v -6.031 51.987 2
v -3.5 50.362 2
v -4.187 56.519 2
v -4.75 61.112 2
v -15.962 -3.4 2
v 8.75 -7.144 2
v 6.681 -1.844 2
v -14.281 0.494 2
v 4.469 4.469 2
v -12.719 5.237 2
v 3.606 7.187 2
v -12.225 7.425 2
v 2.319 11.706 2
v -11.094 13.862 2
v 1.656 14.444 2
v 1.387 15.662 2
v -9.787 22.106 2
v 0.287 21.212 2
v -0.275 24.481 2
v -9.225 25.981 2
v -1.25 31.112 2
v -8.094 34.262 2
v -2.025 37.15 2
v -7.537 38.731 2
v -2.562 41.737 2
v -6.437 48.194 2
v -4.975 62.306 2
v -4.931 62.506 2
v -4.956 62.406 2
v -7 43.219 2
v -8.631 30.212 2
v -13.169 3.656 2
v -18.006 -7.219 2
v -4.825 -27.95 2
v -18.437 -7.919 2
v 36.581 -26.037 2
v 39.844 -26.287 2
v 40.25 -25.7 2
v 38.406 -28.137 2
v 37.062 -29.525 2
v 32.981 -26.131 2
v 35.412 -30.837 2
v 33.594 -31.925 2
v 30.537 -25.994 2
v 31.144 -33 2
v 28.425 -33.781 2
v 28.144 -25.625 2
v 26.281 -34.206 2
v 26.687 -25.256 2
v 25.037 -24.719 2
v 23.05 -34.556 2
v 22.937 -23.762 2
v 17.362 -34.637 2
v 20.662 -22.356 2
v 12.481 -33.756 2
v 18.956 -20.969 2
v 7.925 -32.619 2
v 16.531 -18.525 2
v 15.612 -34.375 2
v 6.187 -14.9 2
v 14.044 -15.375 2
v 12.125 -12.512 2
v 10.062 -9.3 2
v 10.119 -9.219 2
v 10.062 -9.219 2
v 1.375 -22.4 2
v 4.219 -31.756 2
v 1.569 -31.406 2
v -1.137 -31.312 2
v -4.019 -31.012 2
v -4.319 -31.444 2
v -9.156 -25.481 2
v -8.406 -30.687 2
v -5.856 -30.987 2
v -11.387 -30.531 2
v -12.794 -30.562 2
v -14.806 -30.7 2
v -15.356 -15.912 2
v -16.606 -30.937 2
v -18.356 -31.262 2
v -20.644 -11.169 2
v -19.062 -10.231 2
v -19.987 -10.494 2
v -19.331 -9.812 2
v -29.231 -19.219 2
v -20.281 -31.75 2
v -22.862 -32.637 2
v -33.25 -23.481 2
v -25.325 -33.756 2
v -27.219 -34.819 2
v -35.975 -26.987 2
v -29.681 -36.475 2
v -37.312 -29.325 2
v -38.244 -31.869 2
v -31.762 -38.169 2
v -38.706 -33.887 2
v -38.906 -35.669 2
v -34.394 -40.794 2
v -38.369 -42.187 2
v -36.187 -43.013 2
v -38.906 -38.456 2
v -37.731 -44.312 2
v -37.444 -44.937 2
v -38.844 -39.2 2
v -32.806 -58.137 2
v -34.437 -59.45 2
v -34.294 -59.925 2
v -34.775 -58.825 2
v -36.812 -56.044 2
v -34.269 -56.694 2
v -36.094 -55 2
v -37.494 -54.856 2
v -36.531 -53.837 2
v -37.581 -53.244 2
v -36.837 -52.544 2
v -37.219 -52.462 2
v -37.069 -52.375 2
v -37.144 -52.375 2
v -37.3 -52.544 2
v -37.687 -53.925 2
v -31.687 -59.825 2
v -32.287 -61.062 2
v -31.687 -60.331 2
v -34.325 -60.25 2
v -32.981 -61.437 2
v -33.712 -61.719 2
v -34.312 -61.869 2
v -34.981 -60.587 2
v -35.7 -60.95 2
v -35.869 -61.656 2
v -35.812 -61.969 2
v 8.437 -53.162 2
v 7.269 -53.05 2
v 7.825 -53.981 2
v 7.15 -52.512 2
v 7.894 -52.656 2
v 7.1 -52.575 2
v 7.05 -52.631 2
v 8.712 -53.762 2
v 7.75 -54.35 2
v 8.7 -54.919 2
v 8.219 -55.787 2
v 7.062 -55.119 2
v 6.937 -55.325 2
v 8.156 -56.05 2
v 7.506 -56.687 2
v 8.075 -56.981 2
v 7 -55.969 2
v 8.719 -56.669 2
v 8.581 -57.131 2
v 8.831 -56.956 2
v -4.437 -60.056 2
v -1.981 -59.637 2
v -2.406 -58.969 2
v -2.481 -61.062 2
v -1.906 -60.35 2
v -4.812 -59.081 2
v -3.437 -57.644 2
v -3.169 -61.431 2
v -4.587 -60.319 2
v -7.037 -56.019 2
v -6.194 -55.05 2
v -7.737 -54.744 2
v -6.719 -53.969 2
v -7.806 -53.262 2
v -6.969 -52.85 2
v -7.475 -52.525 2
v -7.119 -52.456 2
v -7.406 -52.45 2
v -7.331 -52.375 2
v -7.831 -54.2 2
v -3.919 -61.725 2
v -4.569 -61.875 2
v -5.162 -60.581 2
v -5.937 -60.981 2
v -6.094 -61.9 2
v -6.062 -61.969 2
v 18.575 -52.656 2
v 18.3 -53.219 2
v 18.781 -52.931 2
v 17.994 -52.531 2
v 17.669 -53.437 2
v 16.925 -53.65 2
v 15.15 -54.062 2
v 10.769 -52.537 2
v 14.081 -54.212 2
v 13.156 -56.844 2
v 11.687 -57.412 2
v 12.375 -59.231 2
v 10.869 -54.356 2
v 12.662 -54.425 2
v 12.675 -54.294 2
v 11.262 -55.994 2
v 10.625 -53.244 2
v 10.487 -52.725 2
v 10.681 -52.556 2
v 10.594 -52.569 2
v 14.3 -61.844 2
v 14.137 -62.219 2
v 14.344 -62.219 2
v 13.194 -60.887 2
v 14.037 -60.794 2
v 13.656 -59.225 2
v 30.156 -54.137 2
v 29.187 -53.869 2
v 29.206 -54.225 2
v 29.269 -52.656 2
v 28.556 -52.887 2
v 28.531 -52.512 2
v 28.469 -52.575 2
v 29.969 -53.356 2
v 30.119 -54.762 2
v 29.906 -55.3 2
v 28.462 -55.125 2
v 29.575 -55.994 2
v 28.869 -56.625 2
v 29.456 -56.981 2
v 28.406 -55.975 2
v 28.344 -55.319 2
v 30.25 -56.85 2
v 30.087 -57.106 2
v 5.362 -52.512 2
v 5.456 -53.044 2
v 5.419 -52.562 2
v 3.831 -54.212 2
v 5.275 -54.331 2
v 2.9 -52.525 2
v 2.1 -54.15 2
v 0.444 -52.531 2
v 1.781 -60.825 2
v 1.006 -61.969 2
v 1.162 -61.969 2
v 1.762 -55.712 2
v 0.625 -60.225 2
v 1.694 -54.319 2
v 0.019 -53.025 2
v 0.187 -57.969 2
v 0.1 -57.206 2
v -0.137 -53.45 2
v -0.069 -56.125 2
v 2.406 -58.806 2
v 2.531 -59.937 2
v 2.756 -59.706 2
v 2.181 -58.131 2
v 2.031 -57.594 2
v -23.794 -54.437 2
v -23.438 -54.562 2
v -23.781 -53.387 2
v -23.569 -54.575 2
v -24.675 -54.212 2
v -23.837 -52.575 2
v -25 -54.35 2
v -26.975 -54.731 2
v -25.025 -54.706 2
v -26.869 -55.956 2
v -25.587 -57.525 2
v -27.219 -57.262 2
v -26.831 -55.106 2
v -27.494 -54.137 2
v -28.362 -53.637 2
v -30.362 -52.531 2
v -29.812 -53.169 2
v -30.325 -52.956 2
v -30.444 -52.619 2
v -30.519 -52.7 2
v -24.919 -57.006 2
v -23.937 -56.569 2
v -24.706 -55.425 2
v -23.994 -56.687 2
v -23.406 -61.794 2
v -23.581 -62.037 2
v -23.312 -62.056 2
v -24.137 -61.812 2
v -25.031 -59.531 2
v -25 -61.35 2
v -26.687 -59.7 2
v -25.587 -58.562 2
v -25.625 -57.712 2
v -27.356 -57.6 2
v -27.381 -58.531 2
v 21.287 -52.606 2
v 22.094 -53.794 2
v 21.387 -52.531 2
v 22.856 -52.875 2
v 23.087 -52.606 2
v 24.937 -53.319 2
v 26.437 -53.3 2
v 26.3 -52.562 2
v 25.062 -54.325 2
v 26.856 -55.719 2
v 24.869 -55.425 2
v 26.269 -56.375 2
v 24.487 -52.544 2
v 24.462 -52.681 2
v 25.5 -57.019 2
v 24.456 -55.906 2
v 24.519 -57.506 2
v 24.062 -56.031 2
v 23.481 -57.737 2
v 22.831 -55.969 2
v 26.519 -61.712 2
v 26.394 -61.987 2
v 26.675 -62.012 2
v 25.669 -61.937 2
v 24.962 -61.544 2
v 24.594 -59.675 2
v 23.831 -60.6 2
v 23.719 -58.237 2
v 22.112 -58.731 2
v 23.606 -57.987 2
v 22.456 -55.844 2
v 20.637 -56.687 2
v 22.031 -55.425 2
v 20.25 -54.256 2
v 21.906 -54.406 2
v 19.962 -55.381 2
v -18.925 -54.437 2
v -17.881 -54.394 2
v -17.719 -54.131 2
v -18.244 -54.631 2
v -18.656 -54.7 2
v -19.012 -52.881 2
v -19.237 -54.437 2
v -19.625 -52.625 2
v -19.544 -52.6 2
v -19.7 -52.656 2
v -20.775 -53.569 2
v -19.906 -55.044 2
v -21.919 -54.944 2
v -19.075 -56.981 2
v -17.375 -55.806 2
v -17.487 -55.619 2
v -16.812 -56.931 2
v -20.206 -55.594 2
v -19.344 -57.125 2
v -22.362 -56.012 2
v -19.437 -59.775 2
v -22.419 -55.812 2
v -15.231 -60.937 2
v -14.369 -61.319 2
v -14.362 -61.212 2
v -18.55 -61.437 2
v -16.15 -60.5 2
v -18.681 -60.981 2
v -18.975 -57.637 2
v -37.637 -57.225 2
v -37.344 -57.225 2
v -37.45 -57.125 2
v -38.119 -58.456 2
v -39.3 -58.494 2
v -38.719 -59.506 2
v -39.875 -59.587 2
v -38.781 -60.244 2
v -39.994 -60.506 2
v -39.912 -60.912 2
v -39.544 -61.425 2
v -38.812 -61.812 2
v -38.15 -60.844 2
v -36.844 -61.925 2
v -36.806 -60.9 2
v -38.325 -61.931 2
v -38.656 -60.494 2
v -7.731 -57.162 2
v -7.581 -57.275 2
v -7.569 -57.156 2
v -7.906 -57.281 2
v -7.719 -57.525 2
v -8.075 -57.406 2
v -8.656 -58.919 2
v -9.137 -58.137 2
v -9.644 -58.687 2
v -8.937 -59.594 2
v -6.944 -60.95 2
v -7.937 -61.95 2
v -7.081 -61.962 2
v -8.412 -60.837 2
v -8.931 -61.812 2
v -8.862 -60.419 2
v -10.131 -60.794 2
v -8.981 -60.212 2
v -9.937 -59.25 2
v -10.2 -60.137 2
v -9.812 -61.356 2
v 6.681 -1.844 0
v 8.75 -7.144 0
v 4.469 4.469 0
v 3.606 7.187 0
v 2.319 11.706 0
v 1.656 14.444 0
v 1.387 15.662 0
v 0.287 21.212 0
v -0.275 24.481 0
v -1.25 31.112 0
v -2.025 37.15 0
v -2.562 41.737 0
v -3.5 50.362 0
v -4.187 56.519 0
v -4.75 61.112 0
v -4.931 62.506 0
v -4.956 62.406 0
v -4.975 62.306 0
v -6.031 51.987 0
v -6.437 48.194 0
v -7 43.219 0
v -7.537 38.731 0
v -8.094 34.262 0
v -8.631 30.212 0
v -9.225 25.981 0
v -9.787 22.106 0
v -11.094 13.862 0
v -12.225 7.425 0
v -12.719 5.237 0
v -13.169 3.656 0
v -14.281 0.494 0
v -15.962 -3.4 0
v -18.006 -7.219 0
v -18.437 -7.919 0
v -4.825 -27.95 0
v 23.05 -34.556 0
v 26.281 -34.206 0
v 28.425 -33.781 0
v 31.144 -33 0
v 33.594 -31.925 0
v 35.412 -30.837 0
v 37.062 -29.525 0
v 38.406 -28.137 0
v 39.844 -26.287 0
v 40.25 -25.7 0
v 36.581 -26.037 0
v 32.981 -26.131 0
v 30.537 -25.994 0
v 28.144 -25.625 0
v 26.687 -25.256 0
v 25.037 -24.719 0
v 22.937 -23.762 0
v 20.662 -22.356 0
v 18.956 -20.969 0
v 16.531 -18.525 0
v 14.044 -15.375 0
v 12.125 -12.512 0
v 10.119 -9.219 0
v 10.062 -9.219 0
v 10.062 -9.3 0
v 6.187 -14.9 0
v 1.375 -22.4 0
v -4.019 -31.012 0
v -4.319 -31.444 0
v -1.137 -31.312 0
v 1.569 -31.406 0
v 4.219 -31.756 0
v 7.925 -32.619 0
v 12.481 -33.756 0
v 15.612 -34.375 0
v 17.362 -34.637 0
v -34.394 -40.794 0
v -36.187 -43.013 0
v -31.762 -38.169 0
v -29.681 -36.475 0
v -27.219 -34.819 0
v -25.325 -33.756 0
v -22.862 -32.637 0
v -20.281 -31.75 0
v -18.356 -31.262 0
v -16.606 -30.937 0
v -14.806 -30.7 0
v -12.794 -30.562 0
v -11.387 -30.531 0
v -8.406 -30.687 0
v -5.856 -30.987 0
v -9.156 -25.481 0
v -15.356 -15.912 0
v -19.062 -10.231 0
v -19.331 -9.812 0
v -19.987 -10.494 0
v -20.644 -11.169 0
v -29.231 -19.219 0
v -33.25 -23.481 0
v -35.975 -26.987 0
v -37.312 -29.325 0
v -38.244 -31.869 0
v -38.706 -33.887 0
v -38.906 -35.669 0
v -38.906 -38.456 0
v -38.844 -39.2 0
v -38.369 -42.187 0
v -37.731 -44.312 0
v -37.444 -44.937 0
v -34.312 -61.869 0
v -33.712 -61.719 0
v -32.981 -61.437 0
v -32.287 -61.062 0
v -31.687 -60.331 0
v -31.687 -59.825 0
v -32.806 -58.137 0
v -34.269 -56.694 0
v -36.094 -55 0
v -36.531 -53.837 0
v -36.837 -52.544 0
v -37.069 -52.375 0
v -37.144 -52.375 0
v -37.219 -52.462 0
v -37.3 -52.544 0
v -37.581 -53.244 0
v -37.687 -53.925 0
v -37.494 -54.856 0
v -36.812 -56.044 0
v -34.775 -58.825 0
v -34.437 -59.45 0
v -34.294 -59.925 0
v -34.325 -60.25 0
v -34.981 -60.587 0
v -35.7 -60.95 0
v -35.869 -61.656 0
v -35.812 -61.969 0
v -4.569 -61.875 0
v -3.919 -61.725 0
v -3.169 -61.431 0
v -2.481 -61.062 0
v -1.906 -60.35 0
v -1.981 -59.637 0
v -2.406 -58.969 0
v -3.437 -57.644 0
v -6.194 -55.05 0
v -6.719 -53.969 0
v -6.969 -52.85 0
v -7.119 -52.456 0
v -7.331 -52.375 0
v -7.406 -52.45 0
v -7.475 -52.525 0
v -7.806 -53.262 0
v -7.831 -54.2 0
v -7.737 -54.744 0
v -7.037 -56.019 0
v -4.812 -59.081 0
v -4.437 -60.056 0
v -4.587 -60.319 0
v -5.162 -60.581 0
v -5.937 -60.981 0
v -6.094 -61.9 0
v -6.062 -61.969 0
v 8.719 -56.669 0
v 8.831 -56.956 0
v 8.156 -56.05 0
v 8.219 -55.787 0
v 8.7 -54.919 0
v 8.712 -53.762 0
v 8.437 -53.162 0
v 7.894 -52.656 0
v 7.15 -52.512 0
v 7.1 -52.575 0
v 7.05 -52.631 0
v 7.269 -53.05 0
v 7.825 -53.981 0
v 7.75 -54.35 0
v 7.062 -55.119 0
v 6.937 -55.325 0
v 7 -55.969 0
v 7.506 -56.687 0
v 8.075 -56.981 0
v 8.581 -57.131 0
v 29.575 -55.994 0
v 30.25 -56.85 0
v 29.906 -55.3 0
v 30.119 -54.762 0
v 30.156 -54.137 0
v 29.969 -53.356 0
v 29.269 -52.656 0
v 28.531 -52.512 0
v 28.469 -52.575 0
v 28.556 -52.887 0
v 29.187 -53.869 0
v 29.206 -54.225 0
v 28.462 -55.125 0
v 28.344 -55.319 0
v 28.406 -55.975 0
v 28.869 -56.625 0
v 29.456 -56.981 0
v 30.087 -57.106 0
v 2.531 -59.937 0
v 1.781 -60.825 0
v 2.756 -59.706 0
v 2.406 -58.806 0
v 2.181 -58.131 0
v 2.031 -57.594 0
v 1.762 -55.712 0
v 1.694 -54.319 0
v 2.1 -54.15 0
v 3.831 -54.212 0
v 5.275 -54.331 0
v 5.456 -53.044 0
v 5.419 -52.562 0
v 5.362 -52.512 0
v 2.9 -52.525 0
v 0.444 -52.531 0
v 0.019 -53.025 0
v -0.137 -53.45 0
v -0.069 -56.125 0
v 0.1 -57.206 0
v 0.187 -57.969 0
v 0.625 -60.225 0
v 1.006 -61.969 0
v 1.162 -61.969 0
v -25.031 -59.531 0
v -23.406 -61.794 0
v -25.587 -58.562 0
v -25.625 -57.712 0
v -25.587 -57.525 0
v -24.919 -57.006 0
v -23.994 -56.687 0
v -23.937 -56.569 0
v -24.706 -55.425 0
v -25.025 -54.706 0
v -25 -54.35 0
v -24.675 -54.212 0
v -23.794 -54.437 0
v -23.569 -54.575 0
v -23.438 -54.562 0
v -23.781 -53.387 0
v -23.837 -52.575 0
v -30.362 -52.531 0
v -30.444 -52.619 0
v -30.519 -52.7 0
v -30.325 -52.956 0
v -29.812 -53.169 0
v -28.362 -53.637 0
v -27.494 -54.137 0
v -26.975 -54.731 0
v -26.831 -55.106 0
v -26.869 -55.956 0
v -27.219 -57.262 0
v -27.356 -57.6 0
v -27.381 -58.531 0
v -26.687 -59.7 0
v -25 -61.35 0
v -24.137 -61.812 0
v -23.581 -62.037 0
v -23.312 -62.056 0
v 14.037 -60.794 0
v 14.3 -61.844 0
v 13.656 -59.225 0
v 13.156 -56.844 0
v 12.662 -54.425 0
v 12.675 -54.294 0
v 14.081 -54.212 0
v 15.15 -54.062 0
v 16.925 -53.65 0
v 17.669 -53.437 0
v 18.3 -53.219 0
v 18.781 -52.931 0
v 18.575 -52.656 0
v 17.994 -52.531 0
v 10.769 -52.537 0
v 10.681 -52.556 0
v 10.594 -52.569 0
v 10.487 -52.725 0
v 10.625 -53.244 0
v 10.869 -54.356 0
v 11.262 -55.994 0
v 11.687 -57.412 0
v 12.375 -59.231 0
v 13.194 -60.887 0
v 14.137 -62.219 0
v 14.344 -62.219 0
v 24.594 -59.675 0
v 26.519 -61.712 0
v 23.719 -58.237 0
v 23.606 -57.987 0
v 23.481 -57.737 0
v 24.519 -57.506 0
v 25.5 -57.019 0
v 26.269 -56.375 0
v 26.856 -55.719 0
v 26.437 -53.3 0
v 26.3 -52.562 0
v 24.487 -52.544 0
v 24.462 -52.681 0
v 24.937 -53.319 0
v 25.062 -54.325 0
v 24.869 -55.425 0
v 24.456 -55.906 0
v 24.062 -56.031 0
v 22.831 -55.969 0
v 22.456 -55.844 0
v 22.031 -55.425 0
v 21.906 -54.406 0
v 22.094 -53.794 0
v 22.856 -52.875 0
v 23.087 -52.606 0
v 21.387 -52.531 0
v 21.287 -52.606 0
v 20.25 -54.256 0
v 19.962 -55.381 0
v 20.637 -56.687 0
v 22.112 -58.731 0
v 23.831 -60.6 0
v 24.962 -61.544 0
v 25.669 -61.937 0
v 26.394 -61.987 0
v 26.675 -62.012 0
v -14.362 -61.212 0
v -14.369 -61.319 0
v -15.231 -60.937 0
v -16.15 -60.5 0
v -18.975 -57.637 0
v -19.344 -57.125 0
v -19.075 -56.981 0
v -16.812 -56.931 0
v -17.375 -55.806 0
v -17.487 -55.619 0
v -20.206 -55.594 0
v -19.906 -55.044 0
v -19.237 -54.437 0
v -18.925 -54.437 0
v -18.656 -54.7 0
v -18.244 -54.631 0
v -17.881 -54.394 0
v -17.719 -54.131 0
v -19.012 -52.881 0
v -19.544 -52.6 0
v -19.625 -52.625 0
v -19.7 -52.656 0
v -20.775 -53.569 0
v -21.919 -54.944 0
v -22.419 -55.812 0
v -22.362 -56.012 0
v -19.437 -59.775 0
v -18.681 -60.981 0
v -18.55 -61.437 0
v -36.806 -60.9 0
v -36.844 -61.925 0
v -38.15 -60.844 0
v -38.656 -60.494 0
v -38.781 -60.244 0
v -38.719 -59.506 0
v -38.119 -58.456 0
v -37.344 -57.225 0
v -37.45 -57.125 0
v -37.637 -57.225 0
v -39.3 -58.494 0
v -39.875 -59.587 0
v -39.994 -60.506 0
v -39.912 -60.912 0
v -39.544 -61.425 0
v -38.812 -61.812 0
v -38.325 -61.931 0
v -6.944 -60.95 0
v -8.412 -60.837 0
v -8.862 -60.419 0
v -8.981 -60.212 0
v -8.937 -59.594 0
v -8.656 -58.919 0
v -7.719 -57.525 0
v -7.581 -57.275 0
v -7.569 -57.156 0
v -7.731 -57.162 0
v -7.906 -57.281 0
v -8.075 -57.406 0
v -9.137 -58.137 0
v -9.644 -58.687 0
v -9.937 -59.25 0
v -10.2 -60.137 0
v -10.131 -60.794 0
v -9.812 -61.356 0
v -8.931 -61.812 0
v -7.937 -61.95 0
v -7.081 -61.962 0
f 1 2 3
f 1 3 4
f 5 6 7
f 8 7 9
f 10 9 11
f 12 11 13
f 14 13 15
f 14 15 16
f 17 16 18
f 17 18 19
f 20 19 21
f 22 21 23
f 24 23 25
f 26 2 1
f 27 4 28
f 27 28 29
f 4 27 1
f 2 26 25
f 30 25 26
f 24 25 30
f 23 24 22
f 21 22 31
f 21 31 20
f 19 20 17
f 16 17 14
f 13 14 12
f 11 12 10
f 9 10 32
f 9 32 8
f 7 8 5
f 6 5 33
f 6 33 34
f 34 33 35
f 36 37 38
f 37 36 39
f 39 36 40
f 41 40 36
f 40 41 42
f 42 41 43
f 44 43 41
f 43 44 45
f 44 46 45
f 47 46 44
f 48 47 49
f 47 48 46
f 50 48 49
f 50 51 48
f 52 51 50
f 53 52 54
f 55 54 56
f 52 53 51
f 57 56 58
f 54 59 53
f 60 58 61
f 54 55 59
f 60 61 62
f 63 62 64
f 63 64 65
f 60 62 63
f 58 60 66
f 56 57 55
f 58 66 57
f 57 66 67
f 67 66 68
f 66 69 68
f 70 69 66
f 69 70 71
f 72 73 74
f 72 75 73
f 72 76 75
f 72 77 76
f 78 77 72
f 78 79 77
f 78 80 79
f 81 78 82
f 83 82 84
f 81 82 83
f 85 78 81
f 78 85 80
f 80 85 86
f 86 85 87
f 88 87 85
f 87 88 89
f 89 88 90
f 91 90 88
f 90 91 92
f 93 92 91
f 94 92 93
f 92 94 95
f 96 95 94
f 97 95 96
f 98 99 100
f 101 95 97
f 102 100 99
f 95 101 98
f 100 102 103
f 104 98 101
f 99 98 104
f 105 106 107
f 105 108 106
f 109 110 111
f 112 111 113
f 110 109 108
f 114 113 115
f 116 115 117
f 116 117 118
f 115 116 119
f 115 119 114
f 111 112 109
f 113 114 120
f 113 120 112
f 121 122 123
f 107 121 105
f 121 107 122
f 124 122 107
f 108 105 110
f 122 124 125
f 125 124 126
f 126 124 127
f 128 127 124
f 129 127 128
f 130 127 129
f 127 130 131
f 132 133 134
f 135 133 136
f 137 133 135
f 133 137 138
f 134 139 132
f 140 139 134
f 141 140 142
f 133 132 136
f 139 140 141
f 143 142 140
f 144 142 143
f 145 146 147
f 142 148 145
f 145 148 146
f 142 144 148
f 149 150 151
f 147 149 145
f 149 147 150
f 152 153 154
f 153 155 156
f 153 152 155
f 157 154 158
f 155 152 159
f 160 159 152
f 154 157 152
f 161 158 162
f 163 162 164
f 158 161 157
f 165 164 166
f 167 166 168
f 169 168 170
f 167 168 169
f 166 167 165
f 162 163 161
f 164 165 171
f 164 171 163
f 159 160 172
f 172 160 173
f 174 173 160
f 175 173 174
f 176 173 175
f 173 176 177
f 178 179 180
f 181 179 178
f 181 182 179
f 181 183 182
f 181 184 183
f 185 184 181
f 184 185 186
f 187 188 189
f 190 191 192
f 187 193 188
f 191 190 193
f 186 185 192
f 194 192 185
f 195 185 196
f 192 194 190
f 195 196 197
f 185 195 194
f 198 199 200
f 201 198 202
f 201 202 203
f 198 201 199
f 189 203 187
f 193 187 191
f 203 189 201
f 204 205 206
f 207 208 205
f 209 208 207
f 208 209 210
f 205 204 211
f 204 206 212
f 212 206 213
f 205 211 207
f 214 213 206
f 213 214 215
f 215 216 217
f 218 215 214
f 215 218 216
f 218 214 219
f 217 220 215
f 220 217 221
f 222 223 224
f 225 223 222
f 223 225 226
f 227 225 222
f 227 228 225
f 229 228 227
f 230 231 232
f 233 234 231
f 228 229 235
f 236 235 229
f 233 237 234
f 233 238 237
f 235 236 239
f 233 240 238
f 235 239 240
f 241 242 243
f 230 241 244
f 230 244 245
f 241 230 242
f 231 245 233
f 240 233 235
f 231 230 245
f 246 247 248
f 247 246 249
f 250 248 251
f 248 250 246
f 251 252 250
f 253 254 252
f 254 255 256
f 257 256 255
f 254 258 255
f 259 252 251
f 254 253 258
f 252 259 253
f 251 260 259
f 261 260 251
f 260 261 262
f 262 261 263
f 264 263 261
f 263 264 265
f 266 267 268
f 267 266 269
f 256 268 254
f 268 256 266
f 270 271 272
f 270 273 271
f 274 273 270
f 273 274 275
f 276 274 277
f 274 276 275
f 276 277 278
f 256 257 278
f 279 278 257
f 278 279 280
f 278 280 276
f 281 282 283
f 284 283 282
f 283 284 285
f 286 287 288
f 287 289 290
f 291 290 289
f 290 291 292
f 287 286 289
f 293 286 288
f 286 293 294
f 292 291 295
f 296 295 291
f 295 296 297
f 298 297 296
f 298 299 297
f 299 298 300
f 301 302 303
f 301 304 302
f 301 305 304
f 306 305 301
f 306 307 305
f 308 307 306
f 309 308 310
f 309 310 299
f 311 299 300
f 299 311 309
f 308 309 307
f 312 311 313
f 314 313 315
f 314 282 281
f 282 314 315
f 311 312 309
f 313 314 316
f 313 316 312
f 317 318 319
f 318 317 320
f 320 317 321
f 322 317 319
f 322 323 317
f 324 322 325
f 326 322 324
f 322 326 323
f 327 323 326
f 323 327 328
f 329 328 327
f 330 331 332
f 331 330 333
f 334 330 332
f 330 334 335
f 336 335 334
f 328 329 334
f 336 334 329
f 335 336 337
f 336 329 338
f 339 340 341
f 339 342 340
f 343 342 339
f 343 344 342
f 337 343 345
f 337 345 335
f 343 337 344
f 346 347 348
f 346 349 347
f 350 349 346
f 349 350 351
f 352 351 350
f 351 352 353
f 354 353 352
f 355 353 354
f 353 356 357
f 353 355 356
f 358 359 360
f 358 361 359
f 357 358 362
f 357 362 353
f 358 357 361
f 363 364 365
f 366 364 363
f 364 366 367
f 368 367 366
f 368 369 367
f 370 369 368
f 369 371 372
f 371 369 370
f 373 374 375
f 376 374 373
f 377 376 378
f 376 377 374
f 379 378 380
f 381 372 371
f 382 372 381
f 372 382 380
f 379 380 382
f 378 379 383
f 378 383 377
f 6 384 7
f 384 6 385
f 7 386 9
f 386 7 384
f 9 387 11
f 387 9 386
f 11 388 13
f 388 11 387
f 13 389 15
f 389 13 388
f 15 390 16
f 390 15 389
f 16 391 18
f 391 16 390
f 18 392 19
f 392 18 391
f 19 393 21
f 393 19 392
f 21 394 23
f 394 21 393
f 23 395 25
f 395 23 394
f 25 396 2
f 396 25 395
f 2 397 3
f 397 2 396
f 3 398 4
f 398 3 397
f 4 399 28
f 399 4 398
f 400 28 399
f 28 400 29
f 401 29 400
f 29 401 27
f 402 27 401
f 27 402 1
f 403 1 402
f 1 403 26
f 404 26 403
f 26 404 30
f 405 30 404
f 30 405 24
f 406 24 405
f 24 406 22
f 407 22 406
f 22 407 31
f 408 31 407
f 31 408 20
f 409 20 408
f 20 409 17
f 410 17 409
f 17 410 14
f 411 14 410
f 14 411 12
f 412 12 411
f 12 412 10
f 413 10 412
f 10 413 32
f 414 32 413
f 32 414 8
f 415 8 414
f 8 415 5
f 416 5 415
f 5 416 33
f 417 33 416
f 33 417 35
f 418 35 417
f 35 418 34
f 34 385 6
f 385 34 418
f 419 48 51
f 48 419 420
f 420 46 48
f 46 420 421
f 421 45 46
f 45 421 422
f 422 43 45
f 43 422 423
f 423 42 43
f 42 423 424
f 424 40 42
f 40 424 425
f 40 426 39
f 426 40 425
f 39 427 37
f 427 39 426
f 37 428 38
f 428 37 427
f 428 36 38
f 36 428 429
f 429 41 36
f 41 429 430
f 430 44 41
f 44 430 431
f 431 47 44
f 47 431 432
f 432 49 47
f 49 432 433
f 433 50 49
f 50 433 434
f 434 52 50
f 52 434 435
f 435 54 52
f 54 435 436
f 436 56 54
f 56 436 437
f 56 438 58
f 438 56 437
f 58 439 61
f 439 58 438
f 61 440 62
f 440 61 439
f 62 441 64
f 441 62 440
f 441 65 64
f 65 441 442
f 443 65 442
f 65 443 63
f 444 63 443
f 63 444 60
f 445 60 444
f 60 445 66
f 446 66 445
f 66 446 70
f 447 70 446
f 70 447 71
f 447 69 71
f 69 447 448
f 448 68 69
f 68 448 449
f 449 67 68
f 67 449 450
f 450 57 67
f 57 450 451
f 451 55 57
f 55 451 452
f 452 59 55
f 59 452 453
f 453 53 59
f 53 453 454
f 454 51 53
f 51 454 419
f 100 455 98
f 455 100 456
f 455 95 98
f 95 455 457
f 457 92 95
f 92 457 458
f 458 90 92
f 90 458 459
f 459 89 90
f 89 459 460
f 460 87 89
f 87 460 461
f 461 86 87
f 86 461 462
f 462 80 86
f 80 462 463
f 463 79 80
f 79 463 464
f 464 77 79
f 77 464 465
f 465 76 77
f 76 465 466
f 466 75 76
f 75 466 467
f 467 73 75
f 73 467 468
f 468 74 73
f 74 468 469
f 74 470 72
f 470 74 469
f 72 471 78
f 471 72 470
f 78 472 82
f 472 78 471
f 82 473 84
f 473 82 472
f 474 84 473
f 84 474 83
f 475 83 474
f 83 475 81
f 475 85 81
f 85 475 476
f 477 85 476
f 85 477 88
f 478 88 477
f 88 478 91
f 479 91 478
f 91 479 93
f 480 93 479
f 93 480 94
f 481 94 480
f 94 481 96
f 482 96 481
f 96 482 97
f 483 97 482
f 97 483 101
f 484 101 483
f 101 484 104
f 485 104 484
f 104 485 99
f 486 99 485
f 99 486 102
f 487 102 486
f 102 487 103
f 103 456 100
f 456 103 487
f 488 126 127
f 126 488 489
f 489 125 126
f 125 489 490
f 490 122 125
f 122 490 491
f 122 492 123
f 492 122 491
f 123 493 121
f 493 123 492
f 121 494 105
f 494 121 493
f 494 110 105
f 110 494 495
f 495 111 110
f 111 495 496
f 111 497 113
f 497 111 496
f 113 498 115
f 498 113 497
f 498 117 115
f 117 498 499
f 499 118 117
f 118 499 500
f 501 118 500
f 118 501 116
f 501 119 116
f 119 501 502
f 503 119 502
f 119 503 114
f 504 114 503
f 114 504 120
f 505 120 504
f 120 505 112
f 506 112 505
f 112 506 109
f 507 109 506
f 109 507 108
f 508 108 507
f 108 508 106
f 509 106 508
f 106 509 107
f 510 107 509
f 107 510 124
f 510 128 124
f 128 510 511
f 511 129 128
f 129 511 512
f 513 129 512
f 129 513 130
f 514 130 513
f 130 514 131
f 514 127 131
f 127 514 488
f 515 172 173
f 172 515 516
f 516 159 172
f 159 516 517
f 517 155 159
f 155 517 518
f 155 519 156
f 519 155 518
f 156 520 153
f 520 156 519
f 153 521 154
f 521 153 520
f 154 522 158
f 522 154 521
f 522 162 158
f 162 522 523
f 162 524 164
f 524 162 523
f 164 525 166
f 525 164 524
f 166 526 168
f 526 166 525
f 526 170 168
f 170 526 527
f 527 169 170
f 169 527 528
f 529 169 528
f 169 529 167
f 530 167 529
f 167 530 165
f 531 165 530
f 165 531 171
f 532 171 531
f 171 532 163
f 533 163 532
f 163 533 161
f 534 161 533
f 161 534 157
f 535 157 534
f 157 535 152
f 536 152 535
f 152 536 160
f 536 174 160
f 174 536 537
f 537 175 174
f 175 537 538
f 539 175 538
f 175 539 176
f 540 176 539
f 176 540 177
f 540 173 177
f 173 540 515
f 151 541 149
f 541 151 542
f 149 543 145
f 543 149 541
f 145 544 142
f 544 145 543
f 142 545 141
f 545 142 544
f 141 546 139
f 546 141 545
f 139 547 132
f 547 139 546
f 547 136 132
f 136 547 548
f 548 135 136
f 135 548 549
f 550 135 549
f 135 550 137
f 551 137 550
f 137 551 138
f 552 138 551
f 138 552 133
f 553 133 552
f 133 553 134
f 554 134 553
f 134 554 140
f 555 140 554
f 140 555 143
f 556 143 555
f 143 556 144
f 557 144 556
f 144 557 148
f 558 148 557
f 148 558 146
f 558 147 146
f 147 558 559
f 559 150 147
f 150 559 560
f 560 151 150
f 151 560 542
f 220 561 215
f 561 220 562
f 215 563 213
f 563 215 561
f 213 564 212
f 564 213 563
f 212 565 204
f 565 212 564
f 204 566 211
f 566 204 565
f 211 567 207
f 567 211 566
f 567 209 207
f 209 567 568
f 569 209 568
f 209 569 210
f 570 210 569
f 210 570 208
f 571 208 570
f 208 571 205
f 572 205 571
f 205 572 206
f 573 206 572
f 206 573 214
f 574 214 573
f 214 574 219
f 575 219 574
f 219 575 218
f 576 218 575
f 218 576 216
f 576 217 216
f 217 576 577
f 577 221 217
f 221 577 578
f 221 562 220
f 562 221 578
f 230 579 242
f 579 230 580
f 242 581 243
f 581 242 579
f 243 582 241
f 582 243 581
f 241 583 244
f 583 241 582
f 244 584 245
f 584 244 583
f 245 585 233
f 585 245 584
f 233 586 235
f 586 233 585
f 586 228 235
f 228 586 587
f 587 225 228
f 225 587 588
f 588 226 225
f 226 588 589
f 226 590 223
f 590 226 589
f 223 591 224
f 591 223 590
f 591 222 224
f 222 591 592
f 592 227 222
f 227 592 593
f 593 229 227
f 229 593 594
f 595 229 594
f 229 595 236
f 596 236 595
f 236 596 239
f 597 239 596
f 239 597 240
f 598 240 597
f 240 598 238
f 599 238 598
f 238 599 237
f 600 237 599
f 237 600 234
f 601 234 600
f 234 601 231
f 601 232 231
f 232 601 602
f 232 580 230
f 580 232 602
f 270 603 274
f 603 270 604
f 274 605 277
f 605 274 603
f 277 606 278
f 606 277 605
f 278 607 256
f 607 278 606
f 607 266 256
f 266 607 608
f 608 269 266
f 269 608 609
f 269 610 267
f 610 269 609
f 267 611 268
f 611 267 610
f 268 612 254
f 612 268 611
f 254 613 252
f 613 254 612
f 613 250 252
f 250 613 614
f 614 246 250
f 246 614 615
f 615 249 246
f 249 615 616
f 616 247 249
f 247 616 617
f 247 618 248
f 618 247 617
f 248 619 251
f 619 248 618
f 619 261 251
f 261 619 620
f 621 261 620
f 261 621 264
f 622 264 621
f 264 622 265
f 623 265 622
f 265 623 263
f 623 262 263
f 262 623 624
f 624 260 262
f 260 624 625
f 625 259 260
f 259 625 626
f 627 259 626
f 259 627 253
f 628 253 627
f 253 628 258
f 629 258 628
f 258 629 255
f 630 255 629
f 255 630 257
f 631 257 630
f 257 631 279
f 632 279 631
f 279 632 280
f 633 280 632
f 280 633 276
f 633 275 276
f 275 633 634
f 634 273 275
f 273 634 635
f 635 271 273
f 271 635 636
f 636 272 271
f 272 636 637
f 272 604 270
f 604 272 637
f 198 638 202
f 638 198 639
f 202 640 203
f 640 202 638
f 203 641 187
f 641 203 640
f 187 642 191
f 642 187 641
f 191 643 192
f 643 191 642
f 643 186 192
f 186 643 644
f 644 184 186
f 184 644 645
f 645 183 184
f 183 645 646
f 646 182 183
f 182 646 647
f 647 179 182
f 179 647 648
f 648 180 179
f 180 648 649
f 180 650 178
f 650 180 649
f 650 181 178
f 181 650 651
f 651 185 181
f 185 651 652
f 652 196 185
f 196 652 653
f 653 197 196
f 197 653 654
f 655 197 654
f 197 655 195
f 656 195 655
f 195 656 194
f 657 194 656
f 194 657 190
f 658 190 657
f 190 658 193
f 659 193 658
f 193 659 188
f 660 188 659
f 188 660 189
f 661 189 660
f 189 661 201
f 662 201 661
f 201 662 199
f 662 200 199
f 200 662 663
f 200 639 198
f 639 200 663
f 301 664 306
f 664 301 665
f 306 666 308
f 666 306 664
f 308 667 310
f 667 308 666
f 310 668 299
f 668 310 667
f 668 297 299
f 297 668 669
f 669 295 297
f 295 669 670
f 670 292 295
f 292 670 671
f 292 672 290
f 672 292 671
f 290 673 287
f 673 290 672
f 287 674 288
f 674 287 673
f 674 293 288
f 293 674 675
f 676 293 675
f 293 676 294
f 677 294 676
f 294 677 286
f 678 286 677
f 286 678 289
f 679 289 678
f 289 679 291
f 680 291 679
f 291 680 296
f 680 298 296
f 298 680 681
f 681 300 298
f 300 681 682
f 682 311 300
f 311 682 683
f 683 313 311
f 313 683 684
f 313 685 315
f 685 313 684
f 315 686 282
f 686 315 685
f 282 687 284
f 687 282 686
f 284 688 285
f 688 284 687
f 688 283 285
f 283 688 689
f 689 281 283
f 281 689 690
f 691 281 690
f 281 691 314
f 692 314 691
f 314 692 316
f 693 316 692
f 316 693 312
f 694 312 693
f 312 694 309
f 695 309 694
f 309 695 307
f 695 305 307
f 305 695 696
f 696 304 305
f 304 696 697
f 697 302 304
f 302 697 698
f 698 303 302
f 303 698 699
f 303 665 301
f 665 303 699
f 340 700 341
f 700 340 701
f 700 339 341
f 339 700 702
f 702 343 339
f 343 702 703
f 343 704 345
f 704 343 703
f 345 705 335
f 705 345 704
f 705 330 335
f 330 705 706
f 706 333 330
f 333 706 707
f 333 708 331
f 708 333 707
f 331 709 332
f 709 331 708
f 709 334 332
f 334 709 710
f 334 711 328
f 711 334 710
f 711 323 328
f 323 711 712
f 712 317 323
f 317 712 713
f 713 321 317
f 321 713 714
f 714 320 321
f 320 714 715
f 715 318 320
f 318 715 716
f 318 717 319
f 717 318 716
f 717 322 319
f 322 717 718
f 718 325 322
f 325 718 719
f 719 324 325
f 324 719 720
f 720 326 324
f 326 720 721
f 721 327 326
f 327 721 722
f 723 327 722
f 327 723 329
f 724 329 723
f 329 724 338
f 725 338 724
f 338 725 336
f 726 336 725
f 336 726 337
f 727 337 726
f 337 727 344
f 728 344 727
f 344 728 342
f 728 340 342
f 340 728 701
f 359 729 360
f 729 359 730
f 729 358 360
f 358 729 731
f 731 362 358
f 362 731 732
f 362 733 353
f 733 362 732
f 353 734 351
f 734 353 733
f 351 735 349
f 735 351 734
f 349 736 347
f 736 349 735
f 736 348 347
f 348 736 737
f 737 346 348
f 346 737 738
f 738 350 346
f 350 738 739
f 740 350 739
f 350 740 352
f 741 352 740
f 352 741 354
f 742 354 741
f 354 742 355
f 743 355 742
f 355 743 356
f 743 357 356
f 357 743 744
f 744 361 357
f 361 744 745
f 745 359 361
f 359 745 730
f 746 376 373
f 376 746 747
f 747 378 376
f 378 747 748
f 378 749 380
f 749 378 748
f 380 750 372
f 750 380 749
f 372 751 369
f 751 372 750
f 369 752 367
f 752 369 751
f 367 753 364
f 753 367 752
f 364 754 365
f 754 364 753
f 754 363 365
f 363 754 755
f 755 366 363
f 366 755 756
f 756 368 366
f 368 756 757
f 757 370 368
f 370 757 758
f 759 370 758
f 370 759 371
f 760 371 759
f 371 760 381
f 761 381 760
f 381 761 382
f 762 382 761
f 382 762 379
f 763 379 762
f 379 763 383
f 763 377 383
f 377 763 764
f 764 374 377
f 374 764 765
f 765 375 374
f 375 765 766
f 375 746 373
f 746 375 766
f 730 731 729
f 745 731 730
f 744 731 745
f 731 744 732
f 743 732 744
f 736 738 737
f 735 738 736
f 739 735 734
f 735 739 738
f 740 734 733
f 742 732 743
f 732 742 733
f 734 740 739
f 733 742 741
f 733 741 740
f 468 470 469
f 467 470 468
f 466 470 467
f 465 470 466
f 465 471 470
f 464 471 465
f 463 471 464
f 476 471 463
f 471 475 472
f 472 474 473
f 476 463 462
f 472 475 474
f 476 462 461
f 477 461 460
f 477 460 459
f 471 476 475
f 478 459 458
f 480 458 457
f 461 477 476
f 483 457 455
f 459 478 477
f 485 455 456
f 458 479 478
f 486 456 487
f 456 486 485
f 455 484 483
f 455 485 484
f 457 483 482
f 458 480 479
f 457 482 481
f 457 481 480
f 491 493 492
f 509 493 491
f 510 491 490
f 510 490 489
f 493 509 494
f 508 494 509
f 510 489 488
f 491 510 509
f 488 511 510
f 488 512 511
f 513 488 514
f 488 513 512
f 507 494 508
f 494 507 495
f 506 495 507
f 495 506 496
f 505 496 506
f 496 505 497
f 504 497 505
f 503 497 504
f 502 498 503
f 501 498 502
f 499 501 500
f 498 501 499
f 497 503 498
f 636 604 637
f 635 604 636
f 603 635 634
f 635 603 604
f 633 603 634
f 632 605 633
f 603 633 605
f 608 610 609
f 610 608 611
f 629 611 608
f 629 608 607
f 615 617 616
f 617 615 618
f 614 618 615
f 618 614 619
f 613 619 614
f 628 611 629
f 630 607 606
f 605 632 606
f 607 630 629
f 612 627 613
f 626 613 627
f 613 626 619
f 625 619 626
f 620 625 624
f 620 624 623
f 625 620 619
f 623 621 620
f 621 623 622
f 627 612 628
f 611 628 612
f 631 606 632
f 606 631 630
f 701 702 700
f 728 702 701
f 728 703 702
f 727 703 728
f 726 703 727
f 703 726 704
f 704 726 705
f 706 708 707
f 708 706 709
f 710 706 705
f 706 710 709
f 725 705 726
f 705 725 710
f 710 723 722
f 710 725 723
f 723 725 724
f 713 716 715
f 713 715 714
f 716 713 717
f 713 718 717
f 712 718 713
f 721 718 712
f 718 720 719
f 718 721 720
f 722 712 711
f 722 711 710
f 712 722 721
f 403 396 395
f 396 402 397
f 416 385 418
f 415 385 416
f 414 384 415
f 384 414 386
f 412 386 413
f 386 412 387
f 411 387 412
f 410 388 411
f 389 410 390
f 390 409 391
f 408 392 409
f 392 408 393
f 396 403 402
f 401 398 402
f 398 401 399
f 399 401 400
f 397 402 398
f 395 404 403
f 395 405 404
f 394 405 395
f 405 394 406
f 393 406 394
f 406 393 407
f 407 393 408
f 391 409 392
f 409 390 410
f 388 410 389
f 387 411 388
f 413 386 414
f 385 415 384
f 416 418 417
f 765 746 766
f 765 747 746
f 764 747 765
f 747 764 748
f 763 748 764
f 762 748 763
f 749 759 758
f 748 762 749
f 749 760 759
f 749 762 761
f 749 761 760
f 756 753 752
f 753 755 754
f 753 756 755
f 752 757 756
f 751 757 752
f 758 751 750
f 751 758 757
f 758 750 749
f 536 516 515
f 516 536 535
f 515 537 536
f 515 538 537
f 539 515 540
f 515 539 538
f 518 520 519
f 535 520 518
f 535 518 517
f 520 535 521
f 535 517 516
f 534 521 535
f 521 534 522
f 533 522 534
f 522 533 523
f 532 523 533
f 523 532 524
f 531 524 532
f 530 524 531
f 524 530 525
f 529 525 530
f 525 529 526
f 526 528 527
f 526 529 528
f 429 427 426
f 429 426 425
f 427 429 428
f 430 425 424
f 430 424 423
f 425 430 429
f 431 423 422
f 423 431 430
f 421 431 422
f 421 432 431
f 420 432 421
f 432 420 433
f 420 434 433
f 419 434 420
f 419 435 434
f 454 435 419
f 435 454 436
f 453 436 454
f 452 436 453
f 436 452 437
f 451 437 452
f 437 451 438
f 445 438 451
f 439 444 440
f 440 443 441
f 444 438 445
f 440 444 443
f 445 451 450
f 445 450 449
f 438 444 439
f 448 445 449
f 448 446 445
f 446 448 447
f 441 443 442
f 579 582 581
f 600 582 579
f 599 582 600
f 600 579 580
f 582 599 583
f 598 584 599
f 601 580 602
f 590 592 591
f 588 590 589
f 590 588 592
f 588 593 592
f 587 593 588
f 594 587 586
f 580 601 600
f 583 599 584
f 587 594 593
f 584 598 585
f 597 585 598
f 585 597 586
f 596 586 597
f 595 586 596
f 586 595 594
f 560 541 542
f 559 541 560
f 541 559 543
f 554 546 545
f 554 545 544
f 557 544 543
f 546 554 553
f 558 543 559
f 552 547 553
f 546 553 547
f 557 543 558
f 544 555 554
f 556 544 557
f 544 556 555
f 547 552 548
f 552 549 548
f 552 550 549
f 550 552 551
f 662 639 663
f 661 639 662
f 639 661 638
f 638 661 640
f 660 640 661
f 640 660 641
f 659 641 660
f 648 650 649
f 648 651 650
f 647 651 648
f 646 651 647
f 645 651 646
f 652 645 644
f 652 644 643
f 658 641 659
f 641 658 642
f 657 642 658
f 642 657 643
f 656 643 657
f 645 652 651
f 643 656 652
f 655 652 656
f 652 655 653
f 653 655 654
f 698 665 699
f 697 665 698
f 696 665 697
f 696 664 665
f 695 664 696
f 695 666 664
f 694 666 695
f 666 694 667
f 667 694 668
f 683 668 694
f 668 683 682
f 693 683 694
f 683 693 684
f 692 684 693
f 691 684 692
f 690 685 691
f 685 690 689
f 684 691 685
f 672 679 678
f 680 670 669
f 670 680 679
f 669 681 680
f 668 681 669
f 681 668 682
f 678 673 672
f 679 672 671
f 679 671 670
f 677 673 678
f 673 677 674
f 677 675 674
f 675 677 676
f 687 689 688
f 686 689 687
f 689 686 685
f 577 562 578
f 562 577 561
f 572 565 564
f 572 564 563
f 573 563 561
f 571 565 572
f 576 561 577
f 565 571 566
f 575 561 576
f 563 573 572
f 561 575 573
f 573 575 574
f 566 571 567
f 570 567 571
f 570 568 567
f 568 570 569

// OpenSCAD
module c25e1a98ff640780e42d5752bf732aaa_1()
{
 /* Generated by trace2scad version 20150415
    http://aggregate.org/MAKE/TRACE2SCAD/
    Optimized model has 387/4796 original points
 */
 color([0.48, 0.48, 0.48])
 assign(minx=0) /* polygon minx=39 */
 assign(miny=0) /* polygon miny=45 */
 assign(maxx=12880) /* polygon maxx=12880 */
 assign(maxy=20000) /* polygon maxy=20001 */
 assign(dx=maxx-minx)
 assign(dy=maxy-miny)
 assign(maxd=((dx>dy)?dx:dy))
 scale([1/maxd, 1/maxd, 1])
 translate([-minx-dx/2, -miny-dy/2, 0])
 linear_extrude(height=1, convexity=387)
 union() {
  union() {
   polygon([[5647,19985],[5644,19969],[5475,18318],[5410,17711],[5320,16915],[5234,16197],[5145,15482],[5059,14834],[4964,14157],[4874,13537],[4665,12218],[4484,11188],[4405,10838],[4333,10585],[4155,10079],[3886,9456],[3559,8845],[3490,8733],[5668,5528],[7840,8857],[7509,9705],[7155,10715],[7017,11150],[6811,11873],[6705,12311],[6662,12506],[6486,13394],[6396,13917],[6240,14978],[6116,15944],[6030,16678],[5880,18058],[5770,19043],[5680,19778],[5651,20001]], convexity=6);
   polygon([[8050,8518],[8050,8512],[7430,7616],[6660,6416],[5797,5038],[5749,4969],[6258,4990],[6691,4975],[7115,4919],[7708,4781],[8437,4599],[8938,4500],[9218,4458],[10128,4471],[10645,4527],[10988,4595],[11423,4720],[11815,4892],[12106,5066],[12370,5276],[12585,5498],[12815,5794],[12880,5888],[12293,5834],[11717,5819],[11326,5841],[10943,5900],[10710,5959],[10446,6045],[10110,6198],[9746,6423],[9473,6645],[9085,7036],[8687,7540],[8380,7998],[8059,8525],[8050,8525]], convexity=9);
   polygon([[3242,8321],[3137,8213],[1763,6925],[1120,6243],[684,5682],[470,5308],[321,4901],[247,4578],[215,4293],[215,3847],[225,3728],[301,3250],[403,2910],[449,2810],[650,3118],[937,3473],[1358,3893],[1691,4164],[2085,4429],[2388,4599],[2782,4778],[3195,4920],[3503,4998],[3783,5050],[4071,5088],[4393,5110],[4618,5115],[5095,5090],[5503,5042],[4975,5923],[3983,7454],[3390,8363],[3347,8430]], convexity=7);
   polygon([[485,1606],[472,1593],[427,1481],[410,1372],[441,1223],[550,1033],[876,588],[930,488],[953,412],[948,360],[843,306],[728,248],[701,135],[710,85],[950,101],[1046,125],[1163,170],[1274,230],[1370,347],[1370,428],[1191,698],[957,929],[665,1200],[595,1386],[546,1593],[509,1620],[497,1620]], convexity=8);
   polygon([[5255,1608],[5244,1596],[5191,1478],[5187,1328],[5202,1241],[5314,1037],[5670,547],[5730,391],[5706,349],[5614,307],[5490,243],[5465,96],[5470,85],[5709,100],[5813,124],[5933,171],[6043,230],[6135,344],[6123,458],[6055,565],[5890,777],[5449,1192],[5365,1365],[5325,1544],[5301,1607],[5267,1620]], convexity=8);
   polygon([[6904,1596],[6511,1595],[6443,1516],[6418,1448],[6429,1020],[6456,847],[6470,725],[6540,364],[6601,85],[6626,85],[6725,268],[6845,410],[6881,447],[6825,591],[6789,699],[6765,785],[6722,1086],[6711,1309],[6776,1336],[7053,1326],[7284,1307],[7313,1513],[7307,1590],[7298,1598]], convexity=10);
   polygon([[7576,1588],[7568,1579],[7603,1512],[7692,1363],[7680,1304],[7570,1181],[7550,1148],[7560,1045],[7641,930],[7732,883],[7813,859],[7853,887],[7835,933],[7745,1032],[7755,1074],[7832,1213],[7834,1398],[7790,1494],[7703,1575],[7584,1598]], convexity=10);
   polygon([[11000,1593],[10995,1588],[11009,1538],[11110,1381],[11113,1324],[10994,1180],[10975,1149],[10985,1044],[11059,940],[11153,883],[11254,863],[11280,904],[11172,1041],[11225,1152],[11259,1238],[11265,1338],[11235,1463],[11123,1575],[11005,1598]], convexity=10);
   polygon([[1569,1581],[1557,1568],[1588,1527],[1670,1493],[1902,1418],[2041,1338],[2124,1243],[2147,1183],[2141,1047],[2085,838],[2063,784],[2059,635],[2170,448],[2440,184],[2578,110],[2667,74],[2710,71],[2695,113],[2435,475],[2346,630],[2340,766],[2346,796],[2453,879],[2601,930],[2610,949],[2487,1132],[2436,1247],[2440,1304],[2492,1326],[2633,1290],[2669,1268],[2690,1270],[2635,1458],[2626,1588],[1582,1595]], convexity=13);
   polygon([[8149,1591],[8135,1589],[8118,1564],[8140,1481],[8179,1303],[8242,1041],[8310,814],[8420,523],[8551,258],[8702,45],[8735,45],[8728,105],[8686,273],[8625,524],[8545,905],[8466,1292],[8468,1313],[8693,1326],[8864,1350],[9148,1416],[9267,1450],[9368,1485],[9445,1531],[9412,1575],[9319,1595],[8163,1594]], convexity=9);
   polygon([[9854,1589],[9846,1583],[9680,1319],[9634,1139],[9742,930],[9978,603],[10253,304],[10434,153],[10547,90],[10663,82],[10708,78],[10683,126],[10375,452],[10235,682],[10217,722],[10197,762],[10363,799],[10520,877],[10643,980],[10737,1085],[10670,1472],[10648,1590],[10358,1593],[10354,1571],[10430,1469],[10450,1308],[10419,1132],[10353,1055],[10290,1035],[10093,1045],[10033,1065],[9965,1132],[9945,1295],[9975,1393],[10097,1540],[10134,1583],[9862,1595]], convexity=13);
   polygon([[3300,1580],[3288,1575],[3116,1429],[2933,1209],[2853,1070],[2862,1038],[3330,436],[3451,243],[3472,170],[4141,189],[4142,206],[4003,250],[3856,320],[3404,778],[3345,860],[3388,883],[3750,891],[3660,1071],[3642,1101],[3207,1105],[3255,1193],[3362,1290],[3412,1290],[3455,1248],[3521,1259],[3579,1297],[3605,1339],[3398,1539],[3313,1584]], convexity=12);
   polygon([[433,852],[418,844],[152,641],[60,466],[41,319],[54,254],[113,172],[230,110],[308,91],[545,92],[551,256],[336,265],[255,321],[235,361],[245,479],[341,647],[465,844],[448,860]], convexity=8);
   polygon([[5175,835],[5148,815],[4978,698],[4897,610],[4850,520],[4808,378],[4819,273],[4870,183],[5011,110],[5170,88],[5307,86],[5329,248],[5094,266],[5022,333],[5003,366],[5010,465],[5055,573],[5205,796],[5227,836],[5229,855],[5203,854]], convexity=8);
  }
 }
}

module c25e1a98ff640780e42d5752bf732aaa()
{
 /* all layers combined, scaled to within a 1mm cube */
 scale([1, 1, 1/1])
 difference() {
  union() {
   scale([1,1,2]) translate([0,0,-0.5]) c25e1a98ff640780e42d5752bf732aaa_1();
  }
  translate([0,0,-2]) cube([2,2,4],center=true);
 }
}

scale([125, 125, 2]) {
	c25e1a98ff640780e42d5752bf732aaa();
}
